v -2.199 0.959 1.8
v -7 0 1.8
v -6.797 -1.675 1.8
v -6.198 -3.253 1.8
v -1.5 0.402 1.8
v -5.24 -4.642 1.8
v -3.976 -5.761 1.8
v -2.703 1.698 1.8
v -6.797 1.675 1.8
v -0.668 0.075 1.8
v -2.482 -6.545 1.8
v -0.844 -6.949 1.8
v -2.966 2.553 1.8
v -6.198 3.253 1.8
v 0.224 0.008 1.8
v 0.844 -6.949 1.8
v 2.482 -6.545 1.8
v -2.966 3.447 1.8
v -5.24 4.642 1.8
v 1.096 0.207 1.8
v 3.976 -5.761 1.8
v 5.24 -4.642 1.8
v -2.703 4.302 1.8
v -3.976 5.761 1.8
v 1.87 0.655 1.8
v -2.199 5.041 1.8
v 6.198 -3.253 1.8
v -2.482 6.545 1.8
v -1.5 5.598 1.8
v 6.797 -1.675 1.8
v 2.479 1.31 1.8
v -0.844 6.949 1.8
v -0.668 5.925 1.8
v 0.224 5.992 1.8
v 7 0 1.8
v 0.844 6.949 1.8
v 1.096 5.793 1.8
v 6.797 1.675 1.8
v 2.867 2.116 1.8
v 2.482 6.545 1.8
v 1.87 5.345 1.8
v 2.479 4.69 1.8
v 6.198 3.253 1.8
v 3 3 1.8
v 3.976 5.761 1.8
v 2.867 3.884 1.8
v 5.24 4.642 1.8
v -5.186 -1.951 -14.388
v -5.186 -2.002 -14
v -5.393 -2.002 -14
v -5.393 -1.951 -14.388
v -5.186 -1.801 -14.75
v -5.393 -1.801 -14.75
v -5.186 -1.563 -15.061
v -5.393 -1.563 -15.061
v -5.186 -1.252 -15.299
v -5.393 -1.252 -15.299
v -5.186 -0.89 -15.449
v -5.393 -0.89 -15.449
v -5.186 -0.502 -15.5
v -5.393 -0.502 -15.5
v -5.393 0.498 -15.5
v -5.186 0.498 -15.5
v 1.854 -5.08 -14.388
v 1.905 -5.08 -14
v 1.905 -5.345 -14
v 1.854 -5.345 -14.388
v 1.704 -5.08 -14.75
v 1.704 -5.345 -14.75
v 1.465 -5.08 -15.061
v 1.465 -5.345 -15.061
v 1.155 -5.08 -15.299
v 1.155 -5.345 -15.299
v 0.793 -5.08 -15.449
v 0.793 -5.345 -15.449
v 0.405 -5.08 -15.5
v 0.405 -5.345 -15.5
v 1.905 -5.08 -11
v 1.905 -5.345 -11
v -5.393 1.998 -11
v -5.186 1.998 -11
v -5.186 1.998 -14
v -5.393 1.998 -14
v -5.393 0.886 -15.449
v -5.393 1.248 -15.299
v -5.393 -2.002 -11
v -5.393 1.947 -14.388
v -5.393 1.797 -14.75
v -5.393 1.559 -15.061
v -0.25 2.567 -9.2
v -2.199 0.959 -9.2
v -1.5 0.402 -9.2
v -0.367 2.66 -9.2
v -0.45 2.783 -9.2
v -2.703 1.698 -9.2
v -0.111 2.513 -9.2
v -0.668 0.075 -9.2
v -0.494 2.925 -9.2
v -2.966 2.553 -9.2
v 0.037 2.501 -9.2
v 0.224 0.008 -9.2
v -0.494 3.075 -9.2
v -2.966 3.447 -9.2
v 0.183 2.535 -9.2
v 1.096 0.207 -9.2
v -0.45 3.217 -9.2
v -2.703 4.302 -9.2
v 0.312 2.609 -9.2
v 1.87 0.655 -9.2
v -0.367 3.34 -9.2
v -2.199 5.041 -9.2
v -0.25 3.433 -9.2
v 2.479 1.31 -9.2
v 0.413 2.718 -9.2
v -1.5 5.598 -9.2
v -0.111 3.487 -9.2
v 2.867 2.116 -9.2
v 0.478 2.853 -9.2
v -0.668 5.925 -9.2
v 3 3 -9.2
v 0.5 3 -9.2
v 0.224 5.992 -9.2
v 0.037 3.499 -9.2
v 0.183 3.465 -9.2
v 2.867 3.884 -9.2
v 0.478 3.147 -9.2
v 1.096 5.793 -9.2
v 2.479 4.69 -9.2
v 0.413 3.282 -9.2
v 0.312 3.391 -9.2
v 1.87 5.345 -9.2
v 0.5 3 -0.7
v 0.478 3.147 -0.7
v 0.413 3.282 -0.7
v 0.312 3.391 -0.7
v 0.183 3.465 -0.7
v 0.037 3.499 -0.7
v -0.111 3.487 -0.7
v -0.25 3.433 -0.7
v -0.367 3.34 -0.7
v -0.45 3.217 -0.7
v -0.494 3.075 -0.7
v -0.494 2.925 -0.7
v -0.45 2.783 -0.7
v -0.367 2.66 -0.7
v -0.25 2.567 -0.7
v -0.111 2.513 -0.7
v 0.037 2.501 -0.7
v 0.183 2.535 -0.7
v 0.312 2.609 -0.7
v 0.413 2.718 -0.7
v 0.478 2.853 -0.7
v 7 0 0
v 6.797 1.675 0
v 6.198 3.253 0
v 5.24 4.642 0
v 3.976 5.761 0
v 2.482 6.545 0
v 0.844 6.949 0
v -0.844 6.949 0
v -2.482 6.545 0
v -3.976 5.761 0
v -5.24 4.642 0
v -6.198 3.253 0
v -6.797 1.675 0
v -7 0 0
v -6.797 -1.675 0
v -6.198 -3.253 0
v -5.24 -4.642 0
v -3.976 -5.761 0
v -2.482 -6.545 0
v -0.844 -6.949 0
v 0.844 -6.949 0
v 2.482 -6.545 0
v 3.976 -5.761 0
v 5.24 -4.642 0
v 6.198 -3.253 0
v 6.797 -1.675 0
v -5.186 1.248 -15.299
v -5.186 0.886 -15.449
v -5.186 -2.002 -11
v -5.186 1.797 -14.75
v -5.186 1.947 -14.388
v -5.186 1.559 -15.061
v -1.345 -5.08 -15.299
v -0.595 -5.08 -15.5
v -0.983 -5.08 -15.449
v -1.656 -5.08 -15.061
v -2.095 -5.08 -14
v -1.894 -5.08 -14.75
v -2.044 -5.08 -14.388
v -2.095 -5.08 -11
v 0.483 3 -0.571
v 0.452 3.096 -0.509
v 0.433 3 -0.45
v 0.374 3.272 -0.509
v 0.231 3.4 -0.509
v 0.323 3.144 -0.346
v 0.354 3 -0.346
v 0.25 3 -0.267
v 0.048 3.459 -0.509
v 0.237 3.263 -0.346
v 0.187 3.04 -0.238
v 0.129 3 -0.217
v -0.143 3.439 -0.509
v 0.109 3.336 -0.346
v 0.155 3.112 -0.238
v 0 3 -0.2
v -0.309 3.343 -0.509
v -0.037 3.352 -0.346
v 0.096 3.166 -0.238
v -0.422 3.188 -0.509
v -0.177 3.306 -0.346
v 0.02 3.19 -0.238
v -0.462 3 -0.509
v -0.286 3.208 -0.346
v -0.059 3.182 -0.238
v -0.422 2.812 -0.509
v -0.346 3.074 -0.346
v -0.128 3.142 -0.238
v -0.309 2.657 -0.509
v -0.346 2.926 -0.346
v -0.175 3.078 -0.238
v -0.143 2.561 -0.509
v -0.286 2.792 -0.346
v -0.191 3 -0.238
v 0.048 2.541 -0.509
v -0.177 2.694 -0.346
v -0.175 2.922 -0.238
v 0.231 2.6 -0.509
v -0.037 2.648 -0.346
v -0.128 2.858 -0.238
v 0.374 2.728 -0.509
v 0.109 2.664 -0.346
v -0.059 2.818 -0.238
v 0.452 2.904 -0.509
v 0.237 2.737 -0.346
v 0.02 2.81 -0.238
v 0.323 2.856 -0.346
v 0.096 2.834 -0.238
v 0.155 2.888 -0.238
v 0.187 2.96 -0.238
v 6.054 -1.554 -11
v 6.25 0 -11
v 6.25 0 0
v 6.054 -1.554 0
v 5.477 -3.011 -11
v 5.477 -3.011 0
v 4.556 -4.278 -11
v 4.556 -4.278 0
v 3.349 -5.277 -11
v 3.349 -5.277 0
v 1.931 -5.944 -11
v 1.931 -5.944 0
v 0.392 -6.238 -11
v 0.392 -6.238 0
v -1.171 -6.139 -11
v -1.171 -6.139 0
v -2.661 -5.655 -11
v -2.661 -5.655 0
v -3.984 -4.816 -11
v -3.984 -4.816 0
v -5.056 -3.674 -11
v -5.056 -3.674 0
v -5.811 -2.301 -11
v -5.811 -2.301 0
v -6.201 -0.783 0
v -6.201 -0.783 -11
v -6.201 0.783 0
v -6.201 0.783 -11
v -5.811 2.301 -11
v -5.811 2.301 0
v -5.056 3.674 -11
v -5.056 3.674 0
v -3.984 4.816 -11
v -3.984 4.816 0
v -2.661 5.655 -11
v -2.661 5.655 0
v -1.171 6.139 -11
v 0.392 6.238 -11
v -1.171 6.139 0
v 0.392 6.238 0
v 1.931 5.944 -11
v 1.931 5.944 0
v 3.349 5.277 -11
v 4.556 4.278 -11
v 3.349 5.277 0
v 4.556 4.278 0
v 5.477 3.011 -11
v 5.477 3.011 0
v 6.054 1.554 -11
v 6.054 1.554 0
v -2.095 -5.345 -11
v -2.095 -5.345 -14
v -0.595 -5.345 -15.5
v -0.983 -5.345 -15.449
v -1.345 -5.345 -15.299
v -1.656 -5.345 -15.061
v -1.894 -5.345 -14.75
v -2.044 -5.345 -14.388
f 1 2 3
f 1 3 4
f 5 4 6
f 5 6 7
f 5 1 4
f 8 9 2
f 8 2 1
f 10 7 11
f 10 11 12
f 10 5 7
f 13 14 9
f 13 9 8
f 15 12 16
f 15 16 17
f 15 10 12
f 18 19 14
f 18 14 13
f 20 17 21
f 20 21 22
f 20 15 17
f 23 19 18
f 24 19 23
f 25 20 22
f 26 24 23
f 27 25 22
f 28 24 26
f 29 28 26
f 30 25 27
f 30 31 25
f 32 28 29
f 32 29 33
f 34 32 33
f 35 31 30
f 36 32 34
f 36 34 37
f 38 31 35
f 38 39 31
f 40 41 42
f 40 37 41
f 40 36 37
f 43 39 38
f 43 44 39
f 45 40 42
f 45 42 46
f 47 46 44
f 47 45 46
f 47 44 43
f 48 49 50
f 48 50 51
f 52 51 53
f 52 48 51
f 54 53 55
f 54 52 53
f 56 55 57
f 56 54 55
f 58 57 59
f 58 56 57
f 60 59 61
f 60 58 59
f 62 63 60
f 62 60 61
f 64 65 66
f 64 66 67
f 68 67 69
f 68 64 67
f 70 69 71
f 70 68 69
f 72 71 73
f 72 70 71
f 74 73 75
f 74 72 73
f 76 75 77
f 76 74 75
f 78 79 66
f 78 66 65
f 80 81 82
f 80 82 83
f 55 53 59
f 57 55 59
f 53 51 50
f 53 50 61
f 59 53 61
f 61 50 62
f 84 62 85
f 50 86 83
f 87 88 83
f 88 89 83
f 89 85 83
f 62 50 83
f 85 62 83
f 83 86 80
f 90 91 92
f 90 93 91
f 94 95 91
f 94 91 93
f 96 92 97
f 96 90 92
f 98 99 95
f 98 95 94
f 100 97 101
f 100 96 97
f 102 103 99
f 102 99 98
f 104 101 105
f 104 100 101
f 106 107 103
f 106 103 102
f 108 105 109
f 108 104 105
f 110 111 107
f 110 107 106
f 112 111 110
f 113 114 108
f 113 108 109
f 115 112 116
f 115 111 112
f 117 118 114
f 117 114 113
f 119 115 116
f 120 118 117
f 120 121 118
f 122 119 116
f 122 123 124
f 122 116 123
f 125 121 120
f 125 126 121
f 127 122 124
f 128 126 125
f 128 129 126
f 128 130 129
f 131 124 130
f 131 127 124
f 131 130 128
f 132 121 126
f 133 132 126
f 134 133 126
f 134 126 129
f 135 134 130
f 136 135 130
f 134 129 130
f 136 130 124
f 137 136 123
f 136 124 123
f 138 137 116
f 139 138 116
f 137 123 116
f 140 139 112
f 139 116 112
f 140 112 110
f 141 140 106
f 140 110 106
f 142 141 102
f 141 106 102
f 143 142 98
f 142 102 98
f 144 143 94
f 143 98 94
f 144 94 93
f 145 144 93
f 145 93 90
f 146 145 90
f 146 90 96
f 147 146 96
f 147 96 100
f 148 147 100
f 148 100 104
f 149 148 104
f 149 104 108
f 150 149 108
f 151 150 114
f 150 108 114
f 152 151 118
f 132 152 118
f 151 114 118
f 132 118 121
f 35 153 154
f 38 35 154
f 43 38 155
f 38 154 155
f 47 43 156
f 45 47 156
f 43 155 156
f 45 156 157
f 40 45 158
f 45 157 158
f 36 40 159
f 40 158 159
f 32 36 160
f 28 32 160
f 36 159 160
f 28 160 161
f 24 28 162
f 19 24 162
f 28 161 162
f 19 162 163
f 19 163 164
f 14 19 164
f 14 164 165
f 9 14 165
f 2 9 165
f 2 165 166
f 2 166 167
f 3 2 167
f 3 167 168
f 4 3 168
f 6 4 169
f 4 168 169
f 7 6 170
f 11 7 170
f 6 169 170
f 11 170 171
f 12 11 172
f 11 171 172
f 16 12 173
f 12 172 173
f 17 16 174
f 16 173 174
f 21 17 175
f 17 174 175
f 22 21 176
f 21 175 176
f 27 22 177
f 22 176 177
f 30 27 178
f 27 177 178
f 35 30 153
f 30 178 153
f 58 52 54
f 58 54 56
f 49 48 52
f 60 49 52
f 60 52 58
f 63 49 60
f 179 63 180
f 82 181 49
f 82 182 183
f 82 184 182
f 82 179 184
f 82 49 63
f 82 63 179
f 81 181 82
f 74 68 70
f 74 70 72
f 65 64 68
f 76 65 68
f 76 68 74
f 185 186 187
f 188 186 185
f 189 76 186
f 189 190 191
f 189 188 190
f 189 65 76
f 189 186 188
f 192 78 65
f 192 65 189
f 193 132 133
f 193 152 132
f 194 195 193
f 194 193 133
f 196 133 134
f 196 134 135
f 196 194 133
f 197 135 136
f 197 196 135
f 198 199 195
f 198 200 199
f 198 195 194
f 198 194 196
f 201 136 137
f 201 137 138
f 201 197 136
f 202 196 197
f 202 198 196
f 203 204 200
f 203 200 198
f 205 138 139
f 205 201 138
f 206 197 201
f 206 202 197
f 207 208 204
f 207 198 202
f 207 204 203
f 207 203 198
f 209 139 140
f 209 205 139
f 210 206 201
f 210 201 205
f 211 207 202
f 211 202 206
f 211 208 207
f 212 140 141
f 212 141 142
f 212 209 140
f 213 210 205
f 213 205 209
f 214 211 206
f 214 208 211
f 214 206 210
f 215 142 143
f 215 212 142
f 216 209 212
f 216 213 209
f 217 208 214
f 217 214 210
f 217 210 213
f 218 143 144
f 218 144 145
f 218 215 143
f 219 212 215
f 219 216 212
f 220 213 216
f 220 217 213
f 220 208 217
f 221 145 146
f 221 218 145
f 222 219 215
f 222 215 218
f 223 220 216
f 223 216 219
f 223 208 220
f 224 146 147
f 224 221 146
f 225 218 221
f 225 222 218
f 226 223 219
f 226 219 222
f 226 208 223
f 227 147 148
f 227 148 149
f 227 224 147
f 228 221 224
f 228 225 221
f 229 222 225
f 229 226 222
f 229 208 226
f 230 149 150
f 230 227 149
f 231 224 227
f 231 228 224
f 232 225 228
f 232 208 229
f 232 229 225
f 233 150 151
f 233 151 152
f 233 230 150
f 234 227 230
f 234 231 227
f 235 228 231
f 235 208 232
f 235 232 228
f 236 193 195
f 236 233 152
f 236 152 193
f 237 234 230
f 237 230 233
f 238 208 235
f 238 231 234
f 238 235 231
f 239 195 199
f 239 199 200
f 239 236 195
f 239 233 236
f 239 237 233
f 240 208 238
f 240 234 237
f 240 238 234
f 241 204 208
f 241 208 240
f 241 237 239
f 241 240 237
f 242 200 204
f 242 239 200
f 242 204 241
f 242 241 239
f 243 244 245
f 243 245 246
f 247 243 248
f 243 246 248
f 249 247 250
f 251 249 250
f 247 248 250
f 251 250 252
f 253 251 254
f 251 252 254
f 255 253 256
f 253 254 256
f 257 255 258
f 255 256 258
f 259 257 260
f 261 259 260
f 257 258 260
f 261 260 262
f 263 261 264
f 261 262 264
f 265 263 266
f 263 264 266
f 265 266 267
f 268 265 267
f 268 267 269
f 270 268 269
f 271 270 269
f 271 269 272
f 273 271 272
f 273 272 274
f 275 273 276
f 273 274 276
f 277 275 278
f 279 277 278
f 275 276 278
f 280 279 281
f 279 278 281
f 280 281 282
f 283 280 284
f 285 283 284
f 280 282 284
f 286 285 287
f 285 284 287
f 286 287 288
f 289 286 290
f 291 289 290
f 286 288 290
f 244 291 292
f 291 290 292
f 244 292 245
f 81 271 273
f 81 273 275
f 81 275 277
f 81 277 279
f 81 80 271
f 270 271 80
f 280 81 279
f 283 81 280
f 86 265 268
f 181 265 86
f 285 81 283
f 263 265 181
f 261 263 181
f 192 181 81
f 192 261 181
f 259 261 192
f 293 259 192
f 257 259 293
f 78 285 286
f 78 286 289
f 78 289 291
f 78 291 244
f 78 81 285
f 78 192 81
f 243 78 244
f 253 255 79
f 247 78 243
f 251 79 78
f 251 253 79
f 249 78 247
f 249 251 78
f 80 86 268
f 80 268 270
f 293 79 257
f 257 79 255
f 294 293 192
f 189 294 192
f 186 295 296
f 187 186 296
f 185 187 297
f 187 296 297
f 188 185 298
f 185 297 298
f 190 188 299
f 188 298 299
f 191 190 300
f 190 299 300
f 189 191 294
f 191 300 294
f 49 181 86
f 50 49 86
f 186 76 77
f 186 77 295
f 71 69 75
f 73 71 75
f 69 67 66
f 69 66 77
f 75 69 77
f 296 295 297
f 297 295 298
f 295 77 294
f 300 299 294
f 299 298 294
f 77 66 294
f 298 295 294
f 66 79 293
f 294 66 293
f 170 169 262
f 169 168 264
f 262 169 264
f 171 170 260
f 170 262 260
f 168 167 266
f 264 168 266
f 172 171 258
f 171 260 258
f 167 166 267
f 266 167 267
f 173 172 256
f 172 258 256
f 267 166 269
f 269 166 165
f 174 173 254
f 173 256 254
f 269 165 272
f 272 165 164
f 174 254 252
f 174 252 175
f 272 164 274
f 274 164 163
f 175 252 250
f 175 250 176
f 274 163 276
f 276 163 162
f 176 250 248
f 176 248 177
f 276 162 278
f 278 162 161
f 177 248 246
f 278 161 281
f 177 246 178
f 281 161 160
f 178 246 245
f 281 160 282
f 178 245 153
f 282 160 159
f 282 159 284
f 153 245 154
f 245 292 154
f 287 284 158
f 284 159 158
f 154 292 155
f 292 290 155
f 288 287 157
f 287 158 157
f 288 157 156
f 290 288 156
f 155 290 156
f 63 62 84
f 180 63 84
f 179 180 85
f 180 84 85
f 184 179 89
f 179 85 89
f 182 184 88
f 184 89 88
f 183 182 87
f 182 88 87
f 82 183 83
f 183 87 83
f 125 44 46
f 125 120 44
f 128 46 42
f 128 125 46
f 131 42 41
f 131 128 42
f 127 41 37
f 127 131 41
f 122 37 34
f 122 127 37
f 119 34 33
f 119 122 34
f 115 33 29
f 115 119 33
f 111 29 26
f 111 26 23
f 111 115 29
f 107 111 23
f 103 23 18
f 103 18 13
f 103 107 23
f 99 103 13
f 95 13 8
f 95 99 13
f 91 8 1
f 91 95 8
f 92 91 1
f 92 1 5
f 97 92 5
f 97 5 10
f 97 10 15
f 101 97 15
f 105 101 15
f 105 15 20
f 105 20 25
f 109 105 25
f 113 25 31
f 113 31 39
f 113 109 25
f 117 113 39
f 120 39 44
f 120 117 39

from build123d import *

# Parameters (mm, degrees)
ESBO_O1_R                = 7
ESBO_O1_R_2              = 3
RESSALTO_EXTRUS_O1_DEPTH = 1.8
ESBO_O2_R                = 6.25
RESSALTO_EXTRUS_O2_DEPTH = 11
CORTE_EXTRUS_O1_START    = -11
ESBO_O3_R                = 3
CORTE_EXTRUS_O1_DEPTH    = 11
ESBO_O4_R                = 0.5
RESSALTO_EXTRUS_O3_DEPTH = 9
FILETE1_R                = 0.5
ESBO_O5_W                = 4
ESBO_O5_H                = 0.265788673
ESBO_O5_W_2              = 0.206724524
ESBO_O5_H_2              = 4
RESSALTO_EXTRUS_O4_DEPTH = 4.5
CORTE_EXTRUS_O2_DEPTH    = 2.25
CORTE_EXTRUS_O3_DEPTH    = 2.25


with BuildPart() as part:
    # Esboço1 → Ressalto-extrusão1 (new body)
    with BuildSketch(Plane.XY):
        Circle(ESBO_O1_R)
        with Locations((0, 3)):
            Circle(ESBO_O1_R_2, mode=Mode.SUBTRACT)
    extrude(amount=RESSALTO_EXTRUS_O1_DEPTH)

    # Esboço2 → Ressalto-extrusão2 (add)
    with BuildSketch(Plane(origin=(0, 0, 0), x_dir=(-1, 0, 0), z_dir=(0, 0, -1))):
        with Locations(Location((0, 0, 0), (0, 0, 180))):
            Circle(ESBO_O2_R)
    extrude(amount=RESSALTO_EXTRUS_O2_DEPTH)

    # Esboço3 → Corte-extrusão1 (cut)
    with BuildSketch(Plane.XY.offset(1.8).offset(CORTE_EXTRUS_O1_START)):
        with Locations((0, 3)):
            Circle(ESBO_O3_R)
    extrude(amount=CORTE_EXTRUS_O1_DEPTH, mode=Mode.SUBTRACT)

    # Esboço4 → Ressalto-extrusão3 (add)
    with BuildSketch(Plane.XY.offset(-9.2)):
        with Locations((0, 3)):
            Circle(ESBO_O4_R)
    extrude(amount=RESSALTO_EXTRUS_O3_DEPTH)

    # Filete1
    filete1_edges = [part.edges().sort_by_distance(p)[0] for p in [
        (-0.5, 3, -0.2),
    ]]
    fillet(filete1_edges, radius=FILETE1_R)

    # Esboço5 → Ressalto-extrusão4 (add)
    with BuildSketch(Plane(origin=(0, 0, -11), x_dir=(-1, 0, 0), z_dir=(0, 0, -1))):
        with Locations((0.095181179, -5.212411193)):
            Rectangle(ESBO_O5_W, ESBO_O5_H)
        with Locations((5.289644951, -0.001979347)):
            Rectangle(ESBO_O5_W_2, ESBO_O5_H_2)
    extrude(amount=RESSALTO_EXTRUS_O4_DEPTH)

    # Esboço6 → Corte-extrusão2 (cut, symmetric)
    with BuildSketch(Plane.ZY.offset(5.393007213)):
        with BuildLine():
            Line((-15.5, -2.001979347), (-14, -2.001979347))
            ThreePointArc((-14, -2.001979347), (-15.060660172, -1.562639519), (-15.5, -0.501979347))
            Line((-15.5, -0.501979347), (-15.5, -2.001979347))
        make_face()
        with BuildLine():
            Line((-15.5, 1.998020653), (-15.5, 0.498020653))
            ThreePointArc((-15.5, 0.498020653), (-15.060660172, 1.558680825), (-14, 1.998020653))
            Line((-14, 1.998020653), (-15.5, 1.998020653))
        make_face()
    extrude(amount=CORTE_EXTRUS_O2_DEPTH, both=True, mode=Mode.SUBTRACT)

    # Esboço7 → Corte-extrusão3 (cut, symmetric)
    with BuildSketch(Plane.XZ.offset(5.345305529)):
        with BuildLine():
            Line((1.904818821, -15.5), (1.904818821, -14))
            ThreePointArc((1.904818821, -14), (1.465478993, -15.060660172), (0.404818821, -15.5))
            Line((0.404818821, -15.5), (1.904818821, -15.5))
        make_face()
        with BuildLine():
            Line((-2.095181179, -15.5), (-0.595181179, -15.5))
            ThreePointArc((-0.595181179, -15.5), (-1.655841351, -15.060660172), (-2.095181179, -14))
            Line((-2.095181179, -14), (-2.095181179, -15.5))
        make_face()
    extrude(amount=CORTE_EXTRUS_O3_DEPTH, both=True, mode=Mode.SUBTRACT)


solid = part.part
